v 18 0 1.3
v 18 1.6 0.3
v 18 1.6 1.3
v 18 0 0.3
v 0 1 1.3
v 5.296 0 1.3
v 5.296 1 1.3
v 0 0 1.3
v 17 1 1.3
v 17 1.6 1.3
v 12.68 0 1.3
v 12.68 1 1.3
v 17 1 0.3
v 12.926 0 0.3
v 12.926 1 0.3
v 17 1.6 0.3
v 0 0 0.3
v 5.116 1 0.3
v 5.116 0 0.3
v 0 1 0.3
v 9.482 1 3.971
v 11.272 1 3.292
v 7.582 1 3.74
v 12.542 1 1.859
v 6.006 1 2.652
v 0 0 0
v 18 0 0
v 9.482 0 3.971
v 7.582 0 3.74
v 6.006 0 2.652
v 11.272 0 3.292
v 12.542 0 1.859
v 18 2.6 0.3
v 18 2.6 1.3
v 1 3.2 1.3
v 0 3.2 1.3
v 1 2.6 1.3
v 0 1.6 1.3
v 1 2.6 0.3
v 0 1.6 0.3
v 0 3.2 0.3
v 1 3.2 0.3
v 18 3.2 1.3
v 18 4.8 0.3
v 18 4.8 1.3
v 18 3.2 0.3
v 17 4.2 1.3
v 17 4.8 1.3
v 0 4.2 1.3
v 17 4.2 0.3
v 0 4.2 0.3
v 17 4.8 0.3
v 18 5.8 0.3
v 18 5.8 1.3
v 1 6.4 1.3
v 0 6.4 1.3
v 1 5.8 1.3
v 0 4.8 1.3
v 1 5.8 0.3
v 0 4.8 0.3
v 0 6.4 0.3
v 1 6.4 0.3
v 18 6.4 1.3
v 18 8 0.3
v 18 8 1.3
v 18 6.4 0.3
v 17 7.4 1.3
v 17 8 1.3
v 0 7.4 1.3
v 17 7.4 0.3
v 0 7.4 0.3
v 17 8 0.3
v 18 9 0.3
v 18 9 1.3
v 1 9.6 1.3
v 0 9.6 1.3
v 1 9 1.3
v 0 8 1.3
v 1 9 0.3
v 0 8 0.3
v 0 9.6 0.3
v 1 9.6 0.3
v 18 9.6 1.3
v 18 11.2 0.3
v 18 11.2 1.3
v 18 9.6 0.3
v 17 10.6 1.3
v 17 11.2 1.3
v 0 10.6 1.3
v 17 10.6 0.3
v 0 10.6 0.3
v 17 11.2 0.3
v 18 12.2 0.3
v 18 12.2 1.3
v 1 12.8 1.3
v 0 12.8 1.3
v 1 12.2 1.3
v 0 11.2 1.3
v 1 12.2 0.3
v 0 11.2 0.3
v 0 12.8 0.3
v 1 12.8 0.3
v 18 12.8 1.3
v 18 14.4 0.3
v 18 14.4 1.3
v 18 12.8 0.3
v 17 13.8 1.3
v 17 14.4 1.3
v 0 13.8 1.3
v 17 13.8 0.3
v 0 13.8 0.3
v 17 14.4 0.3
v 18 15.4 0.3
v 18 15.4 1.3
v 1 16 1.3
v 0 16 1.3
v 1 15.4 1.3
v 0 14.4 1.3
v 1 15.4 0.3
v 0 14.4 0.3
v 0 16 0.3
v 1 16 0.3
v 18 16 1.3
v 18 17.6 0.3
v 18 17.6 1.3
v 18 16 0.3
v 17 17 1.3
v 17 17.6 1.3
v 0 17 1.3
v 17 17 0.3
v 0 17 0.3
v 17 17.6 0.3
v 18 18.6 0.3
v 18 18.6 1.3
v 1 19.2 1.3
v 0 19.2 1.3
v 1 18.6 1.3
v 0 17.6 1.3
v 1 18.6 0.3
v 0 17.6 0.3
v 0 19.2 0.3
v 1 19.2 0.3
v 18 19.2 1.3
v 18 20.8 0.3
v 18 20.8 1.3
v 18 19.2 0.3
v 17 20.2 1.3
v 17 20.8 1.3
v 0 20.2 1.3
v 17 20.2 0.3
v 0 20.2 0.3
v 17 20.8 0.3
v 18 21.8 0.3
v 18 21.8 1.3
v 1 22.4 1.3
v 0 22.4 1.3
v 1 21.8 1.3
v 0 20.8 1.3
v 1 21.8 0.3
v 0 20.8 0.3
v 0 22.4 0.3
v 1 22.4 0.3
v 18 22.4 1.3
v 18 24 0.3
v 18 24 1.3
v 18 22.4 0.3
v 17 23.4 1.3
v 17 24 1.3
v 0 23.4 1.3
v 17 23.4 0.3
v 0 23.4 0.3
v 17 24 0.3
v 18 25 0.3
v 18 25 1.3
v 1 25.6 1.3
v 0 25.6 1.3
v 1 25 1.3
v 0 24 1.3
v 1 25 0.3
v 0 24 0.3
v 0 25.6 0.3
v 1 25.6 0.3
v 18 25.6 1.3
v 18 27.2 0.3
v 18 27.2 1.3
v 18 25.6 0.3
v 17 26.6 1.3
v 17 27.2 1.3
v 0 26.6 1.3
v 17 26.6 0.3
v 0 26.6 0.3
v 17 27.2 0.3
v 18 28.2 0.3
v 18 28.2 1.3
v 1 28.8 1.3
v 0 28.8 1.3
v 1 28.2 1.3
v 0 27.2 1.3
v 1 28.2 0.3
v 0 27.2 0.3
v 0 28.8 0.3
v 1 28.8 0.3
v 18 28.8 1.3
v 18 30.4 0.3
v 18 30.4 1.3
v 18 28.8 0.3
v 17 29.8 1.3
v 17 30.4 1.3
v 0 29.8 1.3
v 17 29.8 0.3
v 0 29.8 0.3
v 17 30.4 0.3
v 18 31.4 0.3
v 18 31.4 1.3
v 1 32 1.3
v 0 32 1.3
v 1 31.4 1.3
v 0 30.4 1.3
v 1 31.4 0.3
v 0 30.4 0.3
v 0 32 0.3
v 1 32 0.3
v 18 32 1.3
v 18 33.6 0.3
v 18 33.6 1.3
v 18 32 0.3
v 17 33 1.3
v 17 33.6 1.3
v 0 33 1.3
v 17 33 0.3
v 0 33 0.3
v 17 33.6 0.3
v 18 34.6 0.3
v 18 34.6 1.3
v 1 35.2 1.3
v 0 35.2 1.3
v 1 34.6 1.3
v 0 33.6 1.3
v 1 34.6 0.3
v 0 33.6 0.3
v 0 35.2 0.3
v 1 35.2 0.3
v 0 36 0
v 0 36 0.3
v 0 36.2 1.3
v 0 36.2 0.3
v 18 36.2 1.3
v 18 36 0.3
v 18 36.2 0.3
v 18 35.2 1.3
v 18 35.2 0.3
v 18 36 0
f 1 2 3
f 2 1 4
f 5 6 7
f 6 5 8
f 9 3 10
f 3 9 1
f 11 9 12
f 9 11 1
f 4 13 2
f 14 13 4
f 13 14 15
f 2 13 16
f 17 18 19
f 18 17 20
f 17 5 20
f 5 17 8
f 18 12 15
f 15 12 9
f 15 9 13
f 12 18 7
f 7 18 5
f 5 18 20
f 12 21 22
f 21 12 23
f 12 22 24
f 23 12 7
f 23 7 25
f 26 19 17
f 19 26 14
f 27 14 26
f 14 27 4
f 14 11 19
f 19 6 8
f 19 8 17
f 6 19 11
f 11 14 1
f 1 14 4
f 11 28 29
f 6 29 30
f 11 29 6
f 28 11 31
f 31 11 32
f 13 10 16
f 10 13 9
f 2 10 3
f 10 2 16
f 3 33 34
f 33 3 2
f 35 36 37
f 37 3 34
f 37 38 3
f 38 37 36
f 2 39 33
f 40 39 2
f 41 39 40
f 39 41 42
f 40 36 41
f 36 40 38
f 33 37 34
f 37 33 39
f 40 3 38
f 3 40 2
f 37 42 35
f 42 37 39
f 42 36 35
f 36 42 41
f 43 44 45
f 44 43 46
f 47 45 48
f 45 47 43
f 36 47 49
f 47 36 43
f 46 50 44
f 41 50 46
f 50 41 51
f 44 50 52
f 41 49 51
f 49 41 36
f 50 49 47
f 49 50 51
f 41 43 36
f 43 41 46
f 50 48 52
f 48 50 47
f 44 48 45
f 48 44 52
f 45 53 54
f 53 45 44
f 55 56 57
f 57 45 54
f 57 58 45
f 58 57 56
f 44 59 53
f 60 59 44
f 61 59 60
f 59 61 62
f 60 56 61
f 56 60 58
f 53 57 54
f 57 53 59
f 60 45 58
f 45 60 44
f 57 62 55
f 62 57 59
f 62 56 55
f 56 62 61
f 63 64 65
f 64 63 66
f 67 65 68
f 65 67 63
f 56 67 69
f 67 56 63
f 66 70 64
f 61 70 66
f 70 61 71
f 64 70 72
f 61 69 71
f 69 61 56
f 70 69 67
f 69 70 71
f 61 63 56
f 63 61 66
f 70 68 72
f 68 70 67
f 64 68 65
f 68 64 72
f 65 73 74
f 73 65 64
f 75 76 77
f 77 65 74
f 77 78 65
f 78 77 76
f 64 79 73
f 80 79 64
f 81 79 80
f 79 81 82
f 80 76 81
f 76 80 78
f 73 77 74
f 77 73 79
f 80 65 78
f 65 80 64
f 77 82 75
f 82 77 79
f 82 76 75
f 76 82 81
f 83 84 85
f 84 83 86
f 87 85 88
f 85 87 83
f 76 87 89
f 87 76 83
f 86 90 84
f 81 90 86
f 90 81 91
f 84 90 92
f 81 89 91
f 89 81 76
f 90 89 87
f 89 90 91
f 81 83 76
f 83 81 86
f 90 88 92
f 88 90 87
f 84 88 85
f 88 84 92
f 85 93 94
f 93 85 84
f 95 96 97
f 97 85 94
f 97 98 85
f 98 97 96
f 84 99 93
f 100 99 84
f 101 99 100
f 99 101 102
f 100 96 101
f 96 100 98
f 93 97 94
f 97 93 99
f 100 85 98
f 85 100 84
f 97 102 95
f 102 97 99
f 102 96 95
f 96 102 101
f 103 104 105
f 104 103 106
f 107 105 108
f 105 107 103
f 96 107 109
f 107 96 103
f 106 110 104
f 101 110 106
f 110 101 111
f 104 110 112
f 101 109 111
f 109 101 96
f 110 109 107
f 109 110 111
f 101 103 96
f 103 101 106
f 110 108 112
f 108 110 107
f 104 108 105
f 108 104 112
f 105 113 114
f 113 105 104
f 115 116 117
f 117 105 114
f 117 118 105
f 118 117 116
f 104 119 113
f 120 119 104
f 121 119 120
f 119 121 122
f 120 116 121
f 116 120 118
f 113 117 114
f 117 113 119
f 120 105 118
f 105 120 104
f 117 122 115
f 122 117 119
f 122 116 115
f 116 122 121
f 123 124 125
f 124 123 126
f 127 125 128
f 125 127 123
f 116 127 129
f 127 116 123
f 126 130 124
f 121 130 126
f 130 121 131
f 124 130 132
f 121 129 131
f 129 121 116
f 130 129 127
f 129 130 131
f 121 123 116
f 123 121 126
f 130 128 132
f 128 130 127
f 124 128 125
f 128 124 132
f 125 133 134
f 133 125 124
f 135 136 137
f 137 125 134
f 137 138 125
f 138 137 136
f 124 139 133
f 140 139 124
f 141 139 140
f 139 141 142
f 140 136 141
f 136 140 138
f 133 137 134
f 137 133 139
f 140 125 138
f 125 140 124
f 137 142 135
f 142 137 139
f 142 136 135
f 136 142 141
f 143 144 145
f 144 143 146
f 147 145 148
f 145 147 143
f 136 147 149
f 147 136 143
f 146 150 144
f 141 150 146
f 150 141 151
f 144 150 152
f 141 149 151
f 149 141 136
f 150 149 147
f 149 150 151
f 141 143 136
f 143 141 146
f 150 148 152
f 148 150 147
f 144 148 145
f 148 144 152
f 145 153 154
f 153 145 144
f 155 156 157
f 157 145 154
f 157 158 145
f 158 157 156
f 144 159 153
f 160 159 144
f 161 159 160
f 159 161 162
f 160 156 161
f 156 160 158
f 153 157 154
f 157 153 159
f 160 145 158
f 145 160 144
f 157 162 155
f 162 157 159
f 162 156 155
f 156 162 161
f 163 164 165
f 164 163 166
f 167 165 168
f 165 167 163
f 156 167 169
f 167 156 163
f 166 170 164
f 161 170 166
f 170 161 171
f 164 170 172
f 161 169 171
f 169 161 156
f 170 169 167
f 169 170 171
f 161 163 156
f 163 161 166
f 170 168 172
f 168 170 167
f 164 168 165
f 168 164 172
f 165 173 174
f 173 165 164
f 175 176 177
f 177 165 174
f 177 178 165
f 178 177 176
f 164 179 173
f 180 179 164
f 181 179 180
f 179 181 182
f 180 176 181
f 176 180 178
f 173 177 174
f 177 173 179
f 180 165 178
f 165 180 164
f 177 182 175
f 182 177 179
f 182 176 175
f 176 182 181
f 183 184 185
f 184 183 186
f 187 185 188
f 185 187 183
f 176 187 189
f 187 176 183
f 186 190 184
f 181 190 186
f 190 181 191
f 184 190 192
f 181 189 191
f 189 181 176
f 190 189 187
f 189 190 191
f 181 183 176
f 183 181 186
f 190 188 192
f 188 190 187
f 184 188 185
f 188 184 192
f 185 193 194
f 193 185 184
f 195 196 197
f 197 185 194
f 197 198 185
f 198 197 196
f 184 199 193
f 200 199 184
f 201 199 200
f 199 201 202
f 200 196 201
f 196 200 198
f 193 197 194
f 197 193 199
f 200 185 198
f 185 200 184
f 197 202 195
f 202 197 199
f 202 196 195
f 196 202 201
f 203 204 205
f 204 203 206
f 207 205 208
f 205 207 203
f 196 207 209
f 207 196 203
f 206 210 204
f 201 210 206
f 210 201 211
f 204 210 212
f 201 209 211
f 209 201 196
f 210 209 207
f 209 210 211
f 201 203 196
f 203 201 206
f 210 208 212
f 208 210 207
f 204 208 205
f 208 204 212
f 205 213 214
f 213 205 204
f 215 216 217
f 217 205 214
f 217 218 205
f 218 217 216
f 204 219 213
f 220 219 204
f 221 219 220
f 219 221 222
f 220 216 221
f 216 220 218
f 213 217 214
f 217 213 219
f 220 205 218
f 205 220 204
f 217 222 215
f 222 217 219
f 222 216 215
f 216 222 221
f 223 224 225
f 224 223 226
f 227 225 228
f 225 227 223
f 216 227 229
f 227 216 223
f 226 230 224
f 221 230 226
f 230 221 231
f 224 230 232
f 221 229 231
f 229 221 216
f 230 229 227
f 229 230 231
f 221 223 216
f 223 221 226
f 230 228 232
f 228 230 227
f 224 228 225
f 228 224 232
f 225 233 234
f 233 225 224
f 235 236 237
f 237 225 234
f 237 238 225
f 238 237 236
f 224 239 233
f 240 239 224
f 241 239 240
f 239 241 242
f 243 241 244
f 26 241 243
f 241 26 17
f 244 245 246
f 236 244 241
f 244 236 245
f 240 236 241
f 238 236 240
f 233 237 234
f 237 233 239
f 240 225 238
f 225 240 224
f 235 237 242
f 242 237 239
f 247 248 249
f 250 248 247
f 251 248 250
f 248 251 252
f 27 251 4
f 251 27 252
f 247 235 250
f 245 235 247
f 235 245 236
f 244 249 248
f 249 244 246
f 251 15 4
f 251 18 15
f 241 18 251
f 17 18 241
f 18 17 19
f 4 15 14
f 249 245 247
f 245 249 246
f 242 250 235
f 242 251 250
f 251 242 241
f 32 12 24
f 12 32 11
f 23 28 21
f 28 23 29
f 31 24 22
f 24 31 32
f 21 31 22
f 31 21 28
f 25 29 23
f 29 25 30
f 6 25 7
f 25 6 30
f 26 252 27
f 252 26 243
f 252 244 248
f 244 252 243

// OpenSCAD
module cover_flex(w,h,l,g)
{
union(){
    cube([w,1,h],false);
    if(l == 0)
        {
            cube([1,g,h]);
            }

else if(l == 1)
    {
            translate([w-1,0,0])cube([1,g,h]);
        
        }    
    
    }
        }

g= 1.6;
n = 21;
l = 30;
t = 0.3;
h =1.5;

//flexiable_cover(n,l,h,g,t);
  flexiable_cover(n = 23, l = 18, h = 1, g = 1.6, t = 0.3);      
module flexiable_cover(n,l,h,g,t) {
  union(){

    translate(v = [0,-g,0]) for (a =[1:n]){translate([0,a*g,t]){
    if(a !=n )
        cover_flex(l,h,a%2,g);
    else
        cover_flex(l,h,-12,g);
    }
    }
    
    cube([l,(n-0.5)*g,t],false);
    translate([l/2,0,0]) rotate([-90,0,0])difference(){
    cylinder(h=1,r=4);
    translate([0,2.5,0])cube([50,5,5],true);
    }
}
}
